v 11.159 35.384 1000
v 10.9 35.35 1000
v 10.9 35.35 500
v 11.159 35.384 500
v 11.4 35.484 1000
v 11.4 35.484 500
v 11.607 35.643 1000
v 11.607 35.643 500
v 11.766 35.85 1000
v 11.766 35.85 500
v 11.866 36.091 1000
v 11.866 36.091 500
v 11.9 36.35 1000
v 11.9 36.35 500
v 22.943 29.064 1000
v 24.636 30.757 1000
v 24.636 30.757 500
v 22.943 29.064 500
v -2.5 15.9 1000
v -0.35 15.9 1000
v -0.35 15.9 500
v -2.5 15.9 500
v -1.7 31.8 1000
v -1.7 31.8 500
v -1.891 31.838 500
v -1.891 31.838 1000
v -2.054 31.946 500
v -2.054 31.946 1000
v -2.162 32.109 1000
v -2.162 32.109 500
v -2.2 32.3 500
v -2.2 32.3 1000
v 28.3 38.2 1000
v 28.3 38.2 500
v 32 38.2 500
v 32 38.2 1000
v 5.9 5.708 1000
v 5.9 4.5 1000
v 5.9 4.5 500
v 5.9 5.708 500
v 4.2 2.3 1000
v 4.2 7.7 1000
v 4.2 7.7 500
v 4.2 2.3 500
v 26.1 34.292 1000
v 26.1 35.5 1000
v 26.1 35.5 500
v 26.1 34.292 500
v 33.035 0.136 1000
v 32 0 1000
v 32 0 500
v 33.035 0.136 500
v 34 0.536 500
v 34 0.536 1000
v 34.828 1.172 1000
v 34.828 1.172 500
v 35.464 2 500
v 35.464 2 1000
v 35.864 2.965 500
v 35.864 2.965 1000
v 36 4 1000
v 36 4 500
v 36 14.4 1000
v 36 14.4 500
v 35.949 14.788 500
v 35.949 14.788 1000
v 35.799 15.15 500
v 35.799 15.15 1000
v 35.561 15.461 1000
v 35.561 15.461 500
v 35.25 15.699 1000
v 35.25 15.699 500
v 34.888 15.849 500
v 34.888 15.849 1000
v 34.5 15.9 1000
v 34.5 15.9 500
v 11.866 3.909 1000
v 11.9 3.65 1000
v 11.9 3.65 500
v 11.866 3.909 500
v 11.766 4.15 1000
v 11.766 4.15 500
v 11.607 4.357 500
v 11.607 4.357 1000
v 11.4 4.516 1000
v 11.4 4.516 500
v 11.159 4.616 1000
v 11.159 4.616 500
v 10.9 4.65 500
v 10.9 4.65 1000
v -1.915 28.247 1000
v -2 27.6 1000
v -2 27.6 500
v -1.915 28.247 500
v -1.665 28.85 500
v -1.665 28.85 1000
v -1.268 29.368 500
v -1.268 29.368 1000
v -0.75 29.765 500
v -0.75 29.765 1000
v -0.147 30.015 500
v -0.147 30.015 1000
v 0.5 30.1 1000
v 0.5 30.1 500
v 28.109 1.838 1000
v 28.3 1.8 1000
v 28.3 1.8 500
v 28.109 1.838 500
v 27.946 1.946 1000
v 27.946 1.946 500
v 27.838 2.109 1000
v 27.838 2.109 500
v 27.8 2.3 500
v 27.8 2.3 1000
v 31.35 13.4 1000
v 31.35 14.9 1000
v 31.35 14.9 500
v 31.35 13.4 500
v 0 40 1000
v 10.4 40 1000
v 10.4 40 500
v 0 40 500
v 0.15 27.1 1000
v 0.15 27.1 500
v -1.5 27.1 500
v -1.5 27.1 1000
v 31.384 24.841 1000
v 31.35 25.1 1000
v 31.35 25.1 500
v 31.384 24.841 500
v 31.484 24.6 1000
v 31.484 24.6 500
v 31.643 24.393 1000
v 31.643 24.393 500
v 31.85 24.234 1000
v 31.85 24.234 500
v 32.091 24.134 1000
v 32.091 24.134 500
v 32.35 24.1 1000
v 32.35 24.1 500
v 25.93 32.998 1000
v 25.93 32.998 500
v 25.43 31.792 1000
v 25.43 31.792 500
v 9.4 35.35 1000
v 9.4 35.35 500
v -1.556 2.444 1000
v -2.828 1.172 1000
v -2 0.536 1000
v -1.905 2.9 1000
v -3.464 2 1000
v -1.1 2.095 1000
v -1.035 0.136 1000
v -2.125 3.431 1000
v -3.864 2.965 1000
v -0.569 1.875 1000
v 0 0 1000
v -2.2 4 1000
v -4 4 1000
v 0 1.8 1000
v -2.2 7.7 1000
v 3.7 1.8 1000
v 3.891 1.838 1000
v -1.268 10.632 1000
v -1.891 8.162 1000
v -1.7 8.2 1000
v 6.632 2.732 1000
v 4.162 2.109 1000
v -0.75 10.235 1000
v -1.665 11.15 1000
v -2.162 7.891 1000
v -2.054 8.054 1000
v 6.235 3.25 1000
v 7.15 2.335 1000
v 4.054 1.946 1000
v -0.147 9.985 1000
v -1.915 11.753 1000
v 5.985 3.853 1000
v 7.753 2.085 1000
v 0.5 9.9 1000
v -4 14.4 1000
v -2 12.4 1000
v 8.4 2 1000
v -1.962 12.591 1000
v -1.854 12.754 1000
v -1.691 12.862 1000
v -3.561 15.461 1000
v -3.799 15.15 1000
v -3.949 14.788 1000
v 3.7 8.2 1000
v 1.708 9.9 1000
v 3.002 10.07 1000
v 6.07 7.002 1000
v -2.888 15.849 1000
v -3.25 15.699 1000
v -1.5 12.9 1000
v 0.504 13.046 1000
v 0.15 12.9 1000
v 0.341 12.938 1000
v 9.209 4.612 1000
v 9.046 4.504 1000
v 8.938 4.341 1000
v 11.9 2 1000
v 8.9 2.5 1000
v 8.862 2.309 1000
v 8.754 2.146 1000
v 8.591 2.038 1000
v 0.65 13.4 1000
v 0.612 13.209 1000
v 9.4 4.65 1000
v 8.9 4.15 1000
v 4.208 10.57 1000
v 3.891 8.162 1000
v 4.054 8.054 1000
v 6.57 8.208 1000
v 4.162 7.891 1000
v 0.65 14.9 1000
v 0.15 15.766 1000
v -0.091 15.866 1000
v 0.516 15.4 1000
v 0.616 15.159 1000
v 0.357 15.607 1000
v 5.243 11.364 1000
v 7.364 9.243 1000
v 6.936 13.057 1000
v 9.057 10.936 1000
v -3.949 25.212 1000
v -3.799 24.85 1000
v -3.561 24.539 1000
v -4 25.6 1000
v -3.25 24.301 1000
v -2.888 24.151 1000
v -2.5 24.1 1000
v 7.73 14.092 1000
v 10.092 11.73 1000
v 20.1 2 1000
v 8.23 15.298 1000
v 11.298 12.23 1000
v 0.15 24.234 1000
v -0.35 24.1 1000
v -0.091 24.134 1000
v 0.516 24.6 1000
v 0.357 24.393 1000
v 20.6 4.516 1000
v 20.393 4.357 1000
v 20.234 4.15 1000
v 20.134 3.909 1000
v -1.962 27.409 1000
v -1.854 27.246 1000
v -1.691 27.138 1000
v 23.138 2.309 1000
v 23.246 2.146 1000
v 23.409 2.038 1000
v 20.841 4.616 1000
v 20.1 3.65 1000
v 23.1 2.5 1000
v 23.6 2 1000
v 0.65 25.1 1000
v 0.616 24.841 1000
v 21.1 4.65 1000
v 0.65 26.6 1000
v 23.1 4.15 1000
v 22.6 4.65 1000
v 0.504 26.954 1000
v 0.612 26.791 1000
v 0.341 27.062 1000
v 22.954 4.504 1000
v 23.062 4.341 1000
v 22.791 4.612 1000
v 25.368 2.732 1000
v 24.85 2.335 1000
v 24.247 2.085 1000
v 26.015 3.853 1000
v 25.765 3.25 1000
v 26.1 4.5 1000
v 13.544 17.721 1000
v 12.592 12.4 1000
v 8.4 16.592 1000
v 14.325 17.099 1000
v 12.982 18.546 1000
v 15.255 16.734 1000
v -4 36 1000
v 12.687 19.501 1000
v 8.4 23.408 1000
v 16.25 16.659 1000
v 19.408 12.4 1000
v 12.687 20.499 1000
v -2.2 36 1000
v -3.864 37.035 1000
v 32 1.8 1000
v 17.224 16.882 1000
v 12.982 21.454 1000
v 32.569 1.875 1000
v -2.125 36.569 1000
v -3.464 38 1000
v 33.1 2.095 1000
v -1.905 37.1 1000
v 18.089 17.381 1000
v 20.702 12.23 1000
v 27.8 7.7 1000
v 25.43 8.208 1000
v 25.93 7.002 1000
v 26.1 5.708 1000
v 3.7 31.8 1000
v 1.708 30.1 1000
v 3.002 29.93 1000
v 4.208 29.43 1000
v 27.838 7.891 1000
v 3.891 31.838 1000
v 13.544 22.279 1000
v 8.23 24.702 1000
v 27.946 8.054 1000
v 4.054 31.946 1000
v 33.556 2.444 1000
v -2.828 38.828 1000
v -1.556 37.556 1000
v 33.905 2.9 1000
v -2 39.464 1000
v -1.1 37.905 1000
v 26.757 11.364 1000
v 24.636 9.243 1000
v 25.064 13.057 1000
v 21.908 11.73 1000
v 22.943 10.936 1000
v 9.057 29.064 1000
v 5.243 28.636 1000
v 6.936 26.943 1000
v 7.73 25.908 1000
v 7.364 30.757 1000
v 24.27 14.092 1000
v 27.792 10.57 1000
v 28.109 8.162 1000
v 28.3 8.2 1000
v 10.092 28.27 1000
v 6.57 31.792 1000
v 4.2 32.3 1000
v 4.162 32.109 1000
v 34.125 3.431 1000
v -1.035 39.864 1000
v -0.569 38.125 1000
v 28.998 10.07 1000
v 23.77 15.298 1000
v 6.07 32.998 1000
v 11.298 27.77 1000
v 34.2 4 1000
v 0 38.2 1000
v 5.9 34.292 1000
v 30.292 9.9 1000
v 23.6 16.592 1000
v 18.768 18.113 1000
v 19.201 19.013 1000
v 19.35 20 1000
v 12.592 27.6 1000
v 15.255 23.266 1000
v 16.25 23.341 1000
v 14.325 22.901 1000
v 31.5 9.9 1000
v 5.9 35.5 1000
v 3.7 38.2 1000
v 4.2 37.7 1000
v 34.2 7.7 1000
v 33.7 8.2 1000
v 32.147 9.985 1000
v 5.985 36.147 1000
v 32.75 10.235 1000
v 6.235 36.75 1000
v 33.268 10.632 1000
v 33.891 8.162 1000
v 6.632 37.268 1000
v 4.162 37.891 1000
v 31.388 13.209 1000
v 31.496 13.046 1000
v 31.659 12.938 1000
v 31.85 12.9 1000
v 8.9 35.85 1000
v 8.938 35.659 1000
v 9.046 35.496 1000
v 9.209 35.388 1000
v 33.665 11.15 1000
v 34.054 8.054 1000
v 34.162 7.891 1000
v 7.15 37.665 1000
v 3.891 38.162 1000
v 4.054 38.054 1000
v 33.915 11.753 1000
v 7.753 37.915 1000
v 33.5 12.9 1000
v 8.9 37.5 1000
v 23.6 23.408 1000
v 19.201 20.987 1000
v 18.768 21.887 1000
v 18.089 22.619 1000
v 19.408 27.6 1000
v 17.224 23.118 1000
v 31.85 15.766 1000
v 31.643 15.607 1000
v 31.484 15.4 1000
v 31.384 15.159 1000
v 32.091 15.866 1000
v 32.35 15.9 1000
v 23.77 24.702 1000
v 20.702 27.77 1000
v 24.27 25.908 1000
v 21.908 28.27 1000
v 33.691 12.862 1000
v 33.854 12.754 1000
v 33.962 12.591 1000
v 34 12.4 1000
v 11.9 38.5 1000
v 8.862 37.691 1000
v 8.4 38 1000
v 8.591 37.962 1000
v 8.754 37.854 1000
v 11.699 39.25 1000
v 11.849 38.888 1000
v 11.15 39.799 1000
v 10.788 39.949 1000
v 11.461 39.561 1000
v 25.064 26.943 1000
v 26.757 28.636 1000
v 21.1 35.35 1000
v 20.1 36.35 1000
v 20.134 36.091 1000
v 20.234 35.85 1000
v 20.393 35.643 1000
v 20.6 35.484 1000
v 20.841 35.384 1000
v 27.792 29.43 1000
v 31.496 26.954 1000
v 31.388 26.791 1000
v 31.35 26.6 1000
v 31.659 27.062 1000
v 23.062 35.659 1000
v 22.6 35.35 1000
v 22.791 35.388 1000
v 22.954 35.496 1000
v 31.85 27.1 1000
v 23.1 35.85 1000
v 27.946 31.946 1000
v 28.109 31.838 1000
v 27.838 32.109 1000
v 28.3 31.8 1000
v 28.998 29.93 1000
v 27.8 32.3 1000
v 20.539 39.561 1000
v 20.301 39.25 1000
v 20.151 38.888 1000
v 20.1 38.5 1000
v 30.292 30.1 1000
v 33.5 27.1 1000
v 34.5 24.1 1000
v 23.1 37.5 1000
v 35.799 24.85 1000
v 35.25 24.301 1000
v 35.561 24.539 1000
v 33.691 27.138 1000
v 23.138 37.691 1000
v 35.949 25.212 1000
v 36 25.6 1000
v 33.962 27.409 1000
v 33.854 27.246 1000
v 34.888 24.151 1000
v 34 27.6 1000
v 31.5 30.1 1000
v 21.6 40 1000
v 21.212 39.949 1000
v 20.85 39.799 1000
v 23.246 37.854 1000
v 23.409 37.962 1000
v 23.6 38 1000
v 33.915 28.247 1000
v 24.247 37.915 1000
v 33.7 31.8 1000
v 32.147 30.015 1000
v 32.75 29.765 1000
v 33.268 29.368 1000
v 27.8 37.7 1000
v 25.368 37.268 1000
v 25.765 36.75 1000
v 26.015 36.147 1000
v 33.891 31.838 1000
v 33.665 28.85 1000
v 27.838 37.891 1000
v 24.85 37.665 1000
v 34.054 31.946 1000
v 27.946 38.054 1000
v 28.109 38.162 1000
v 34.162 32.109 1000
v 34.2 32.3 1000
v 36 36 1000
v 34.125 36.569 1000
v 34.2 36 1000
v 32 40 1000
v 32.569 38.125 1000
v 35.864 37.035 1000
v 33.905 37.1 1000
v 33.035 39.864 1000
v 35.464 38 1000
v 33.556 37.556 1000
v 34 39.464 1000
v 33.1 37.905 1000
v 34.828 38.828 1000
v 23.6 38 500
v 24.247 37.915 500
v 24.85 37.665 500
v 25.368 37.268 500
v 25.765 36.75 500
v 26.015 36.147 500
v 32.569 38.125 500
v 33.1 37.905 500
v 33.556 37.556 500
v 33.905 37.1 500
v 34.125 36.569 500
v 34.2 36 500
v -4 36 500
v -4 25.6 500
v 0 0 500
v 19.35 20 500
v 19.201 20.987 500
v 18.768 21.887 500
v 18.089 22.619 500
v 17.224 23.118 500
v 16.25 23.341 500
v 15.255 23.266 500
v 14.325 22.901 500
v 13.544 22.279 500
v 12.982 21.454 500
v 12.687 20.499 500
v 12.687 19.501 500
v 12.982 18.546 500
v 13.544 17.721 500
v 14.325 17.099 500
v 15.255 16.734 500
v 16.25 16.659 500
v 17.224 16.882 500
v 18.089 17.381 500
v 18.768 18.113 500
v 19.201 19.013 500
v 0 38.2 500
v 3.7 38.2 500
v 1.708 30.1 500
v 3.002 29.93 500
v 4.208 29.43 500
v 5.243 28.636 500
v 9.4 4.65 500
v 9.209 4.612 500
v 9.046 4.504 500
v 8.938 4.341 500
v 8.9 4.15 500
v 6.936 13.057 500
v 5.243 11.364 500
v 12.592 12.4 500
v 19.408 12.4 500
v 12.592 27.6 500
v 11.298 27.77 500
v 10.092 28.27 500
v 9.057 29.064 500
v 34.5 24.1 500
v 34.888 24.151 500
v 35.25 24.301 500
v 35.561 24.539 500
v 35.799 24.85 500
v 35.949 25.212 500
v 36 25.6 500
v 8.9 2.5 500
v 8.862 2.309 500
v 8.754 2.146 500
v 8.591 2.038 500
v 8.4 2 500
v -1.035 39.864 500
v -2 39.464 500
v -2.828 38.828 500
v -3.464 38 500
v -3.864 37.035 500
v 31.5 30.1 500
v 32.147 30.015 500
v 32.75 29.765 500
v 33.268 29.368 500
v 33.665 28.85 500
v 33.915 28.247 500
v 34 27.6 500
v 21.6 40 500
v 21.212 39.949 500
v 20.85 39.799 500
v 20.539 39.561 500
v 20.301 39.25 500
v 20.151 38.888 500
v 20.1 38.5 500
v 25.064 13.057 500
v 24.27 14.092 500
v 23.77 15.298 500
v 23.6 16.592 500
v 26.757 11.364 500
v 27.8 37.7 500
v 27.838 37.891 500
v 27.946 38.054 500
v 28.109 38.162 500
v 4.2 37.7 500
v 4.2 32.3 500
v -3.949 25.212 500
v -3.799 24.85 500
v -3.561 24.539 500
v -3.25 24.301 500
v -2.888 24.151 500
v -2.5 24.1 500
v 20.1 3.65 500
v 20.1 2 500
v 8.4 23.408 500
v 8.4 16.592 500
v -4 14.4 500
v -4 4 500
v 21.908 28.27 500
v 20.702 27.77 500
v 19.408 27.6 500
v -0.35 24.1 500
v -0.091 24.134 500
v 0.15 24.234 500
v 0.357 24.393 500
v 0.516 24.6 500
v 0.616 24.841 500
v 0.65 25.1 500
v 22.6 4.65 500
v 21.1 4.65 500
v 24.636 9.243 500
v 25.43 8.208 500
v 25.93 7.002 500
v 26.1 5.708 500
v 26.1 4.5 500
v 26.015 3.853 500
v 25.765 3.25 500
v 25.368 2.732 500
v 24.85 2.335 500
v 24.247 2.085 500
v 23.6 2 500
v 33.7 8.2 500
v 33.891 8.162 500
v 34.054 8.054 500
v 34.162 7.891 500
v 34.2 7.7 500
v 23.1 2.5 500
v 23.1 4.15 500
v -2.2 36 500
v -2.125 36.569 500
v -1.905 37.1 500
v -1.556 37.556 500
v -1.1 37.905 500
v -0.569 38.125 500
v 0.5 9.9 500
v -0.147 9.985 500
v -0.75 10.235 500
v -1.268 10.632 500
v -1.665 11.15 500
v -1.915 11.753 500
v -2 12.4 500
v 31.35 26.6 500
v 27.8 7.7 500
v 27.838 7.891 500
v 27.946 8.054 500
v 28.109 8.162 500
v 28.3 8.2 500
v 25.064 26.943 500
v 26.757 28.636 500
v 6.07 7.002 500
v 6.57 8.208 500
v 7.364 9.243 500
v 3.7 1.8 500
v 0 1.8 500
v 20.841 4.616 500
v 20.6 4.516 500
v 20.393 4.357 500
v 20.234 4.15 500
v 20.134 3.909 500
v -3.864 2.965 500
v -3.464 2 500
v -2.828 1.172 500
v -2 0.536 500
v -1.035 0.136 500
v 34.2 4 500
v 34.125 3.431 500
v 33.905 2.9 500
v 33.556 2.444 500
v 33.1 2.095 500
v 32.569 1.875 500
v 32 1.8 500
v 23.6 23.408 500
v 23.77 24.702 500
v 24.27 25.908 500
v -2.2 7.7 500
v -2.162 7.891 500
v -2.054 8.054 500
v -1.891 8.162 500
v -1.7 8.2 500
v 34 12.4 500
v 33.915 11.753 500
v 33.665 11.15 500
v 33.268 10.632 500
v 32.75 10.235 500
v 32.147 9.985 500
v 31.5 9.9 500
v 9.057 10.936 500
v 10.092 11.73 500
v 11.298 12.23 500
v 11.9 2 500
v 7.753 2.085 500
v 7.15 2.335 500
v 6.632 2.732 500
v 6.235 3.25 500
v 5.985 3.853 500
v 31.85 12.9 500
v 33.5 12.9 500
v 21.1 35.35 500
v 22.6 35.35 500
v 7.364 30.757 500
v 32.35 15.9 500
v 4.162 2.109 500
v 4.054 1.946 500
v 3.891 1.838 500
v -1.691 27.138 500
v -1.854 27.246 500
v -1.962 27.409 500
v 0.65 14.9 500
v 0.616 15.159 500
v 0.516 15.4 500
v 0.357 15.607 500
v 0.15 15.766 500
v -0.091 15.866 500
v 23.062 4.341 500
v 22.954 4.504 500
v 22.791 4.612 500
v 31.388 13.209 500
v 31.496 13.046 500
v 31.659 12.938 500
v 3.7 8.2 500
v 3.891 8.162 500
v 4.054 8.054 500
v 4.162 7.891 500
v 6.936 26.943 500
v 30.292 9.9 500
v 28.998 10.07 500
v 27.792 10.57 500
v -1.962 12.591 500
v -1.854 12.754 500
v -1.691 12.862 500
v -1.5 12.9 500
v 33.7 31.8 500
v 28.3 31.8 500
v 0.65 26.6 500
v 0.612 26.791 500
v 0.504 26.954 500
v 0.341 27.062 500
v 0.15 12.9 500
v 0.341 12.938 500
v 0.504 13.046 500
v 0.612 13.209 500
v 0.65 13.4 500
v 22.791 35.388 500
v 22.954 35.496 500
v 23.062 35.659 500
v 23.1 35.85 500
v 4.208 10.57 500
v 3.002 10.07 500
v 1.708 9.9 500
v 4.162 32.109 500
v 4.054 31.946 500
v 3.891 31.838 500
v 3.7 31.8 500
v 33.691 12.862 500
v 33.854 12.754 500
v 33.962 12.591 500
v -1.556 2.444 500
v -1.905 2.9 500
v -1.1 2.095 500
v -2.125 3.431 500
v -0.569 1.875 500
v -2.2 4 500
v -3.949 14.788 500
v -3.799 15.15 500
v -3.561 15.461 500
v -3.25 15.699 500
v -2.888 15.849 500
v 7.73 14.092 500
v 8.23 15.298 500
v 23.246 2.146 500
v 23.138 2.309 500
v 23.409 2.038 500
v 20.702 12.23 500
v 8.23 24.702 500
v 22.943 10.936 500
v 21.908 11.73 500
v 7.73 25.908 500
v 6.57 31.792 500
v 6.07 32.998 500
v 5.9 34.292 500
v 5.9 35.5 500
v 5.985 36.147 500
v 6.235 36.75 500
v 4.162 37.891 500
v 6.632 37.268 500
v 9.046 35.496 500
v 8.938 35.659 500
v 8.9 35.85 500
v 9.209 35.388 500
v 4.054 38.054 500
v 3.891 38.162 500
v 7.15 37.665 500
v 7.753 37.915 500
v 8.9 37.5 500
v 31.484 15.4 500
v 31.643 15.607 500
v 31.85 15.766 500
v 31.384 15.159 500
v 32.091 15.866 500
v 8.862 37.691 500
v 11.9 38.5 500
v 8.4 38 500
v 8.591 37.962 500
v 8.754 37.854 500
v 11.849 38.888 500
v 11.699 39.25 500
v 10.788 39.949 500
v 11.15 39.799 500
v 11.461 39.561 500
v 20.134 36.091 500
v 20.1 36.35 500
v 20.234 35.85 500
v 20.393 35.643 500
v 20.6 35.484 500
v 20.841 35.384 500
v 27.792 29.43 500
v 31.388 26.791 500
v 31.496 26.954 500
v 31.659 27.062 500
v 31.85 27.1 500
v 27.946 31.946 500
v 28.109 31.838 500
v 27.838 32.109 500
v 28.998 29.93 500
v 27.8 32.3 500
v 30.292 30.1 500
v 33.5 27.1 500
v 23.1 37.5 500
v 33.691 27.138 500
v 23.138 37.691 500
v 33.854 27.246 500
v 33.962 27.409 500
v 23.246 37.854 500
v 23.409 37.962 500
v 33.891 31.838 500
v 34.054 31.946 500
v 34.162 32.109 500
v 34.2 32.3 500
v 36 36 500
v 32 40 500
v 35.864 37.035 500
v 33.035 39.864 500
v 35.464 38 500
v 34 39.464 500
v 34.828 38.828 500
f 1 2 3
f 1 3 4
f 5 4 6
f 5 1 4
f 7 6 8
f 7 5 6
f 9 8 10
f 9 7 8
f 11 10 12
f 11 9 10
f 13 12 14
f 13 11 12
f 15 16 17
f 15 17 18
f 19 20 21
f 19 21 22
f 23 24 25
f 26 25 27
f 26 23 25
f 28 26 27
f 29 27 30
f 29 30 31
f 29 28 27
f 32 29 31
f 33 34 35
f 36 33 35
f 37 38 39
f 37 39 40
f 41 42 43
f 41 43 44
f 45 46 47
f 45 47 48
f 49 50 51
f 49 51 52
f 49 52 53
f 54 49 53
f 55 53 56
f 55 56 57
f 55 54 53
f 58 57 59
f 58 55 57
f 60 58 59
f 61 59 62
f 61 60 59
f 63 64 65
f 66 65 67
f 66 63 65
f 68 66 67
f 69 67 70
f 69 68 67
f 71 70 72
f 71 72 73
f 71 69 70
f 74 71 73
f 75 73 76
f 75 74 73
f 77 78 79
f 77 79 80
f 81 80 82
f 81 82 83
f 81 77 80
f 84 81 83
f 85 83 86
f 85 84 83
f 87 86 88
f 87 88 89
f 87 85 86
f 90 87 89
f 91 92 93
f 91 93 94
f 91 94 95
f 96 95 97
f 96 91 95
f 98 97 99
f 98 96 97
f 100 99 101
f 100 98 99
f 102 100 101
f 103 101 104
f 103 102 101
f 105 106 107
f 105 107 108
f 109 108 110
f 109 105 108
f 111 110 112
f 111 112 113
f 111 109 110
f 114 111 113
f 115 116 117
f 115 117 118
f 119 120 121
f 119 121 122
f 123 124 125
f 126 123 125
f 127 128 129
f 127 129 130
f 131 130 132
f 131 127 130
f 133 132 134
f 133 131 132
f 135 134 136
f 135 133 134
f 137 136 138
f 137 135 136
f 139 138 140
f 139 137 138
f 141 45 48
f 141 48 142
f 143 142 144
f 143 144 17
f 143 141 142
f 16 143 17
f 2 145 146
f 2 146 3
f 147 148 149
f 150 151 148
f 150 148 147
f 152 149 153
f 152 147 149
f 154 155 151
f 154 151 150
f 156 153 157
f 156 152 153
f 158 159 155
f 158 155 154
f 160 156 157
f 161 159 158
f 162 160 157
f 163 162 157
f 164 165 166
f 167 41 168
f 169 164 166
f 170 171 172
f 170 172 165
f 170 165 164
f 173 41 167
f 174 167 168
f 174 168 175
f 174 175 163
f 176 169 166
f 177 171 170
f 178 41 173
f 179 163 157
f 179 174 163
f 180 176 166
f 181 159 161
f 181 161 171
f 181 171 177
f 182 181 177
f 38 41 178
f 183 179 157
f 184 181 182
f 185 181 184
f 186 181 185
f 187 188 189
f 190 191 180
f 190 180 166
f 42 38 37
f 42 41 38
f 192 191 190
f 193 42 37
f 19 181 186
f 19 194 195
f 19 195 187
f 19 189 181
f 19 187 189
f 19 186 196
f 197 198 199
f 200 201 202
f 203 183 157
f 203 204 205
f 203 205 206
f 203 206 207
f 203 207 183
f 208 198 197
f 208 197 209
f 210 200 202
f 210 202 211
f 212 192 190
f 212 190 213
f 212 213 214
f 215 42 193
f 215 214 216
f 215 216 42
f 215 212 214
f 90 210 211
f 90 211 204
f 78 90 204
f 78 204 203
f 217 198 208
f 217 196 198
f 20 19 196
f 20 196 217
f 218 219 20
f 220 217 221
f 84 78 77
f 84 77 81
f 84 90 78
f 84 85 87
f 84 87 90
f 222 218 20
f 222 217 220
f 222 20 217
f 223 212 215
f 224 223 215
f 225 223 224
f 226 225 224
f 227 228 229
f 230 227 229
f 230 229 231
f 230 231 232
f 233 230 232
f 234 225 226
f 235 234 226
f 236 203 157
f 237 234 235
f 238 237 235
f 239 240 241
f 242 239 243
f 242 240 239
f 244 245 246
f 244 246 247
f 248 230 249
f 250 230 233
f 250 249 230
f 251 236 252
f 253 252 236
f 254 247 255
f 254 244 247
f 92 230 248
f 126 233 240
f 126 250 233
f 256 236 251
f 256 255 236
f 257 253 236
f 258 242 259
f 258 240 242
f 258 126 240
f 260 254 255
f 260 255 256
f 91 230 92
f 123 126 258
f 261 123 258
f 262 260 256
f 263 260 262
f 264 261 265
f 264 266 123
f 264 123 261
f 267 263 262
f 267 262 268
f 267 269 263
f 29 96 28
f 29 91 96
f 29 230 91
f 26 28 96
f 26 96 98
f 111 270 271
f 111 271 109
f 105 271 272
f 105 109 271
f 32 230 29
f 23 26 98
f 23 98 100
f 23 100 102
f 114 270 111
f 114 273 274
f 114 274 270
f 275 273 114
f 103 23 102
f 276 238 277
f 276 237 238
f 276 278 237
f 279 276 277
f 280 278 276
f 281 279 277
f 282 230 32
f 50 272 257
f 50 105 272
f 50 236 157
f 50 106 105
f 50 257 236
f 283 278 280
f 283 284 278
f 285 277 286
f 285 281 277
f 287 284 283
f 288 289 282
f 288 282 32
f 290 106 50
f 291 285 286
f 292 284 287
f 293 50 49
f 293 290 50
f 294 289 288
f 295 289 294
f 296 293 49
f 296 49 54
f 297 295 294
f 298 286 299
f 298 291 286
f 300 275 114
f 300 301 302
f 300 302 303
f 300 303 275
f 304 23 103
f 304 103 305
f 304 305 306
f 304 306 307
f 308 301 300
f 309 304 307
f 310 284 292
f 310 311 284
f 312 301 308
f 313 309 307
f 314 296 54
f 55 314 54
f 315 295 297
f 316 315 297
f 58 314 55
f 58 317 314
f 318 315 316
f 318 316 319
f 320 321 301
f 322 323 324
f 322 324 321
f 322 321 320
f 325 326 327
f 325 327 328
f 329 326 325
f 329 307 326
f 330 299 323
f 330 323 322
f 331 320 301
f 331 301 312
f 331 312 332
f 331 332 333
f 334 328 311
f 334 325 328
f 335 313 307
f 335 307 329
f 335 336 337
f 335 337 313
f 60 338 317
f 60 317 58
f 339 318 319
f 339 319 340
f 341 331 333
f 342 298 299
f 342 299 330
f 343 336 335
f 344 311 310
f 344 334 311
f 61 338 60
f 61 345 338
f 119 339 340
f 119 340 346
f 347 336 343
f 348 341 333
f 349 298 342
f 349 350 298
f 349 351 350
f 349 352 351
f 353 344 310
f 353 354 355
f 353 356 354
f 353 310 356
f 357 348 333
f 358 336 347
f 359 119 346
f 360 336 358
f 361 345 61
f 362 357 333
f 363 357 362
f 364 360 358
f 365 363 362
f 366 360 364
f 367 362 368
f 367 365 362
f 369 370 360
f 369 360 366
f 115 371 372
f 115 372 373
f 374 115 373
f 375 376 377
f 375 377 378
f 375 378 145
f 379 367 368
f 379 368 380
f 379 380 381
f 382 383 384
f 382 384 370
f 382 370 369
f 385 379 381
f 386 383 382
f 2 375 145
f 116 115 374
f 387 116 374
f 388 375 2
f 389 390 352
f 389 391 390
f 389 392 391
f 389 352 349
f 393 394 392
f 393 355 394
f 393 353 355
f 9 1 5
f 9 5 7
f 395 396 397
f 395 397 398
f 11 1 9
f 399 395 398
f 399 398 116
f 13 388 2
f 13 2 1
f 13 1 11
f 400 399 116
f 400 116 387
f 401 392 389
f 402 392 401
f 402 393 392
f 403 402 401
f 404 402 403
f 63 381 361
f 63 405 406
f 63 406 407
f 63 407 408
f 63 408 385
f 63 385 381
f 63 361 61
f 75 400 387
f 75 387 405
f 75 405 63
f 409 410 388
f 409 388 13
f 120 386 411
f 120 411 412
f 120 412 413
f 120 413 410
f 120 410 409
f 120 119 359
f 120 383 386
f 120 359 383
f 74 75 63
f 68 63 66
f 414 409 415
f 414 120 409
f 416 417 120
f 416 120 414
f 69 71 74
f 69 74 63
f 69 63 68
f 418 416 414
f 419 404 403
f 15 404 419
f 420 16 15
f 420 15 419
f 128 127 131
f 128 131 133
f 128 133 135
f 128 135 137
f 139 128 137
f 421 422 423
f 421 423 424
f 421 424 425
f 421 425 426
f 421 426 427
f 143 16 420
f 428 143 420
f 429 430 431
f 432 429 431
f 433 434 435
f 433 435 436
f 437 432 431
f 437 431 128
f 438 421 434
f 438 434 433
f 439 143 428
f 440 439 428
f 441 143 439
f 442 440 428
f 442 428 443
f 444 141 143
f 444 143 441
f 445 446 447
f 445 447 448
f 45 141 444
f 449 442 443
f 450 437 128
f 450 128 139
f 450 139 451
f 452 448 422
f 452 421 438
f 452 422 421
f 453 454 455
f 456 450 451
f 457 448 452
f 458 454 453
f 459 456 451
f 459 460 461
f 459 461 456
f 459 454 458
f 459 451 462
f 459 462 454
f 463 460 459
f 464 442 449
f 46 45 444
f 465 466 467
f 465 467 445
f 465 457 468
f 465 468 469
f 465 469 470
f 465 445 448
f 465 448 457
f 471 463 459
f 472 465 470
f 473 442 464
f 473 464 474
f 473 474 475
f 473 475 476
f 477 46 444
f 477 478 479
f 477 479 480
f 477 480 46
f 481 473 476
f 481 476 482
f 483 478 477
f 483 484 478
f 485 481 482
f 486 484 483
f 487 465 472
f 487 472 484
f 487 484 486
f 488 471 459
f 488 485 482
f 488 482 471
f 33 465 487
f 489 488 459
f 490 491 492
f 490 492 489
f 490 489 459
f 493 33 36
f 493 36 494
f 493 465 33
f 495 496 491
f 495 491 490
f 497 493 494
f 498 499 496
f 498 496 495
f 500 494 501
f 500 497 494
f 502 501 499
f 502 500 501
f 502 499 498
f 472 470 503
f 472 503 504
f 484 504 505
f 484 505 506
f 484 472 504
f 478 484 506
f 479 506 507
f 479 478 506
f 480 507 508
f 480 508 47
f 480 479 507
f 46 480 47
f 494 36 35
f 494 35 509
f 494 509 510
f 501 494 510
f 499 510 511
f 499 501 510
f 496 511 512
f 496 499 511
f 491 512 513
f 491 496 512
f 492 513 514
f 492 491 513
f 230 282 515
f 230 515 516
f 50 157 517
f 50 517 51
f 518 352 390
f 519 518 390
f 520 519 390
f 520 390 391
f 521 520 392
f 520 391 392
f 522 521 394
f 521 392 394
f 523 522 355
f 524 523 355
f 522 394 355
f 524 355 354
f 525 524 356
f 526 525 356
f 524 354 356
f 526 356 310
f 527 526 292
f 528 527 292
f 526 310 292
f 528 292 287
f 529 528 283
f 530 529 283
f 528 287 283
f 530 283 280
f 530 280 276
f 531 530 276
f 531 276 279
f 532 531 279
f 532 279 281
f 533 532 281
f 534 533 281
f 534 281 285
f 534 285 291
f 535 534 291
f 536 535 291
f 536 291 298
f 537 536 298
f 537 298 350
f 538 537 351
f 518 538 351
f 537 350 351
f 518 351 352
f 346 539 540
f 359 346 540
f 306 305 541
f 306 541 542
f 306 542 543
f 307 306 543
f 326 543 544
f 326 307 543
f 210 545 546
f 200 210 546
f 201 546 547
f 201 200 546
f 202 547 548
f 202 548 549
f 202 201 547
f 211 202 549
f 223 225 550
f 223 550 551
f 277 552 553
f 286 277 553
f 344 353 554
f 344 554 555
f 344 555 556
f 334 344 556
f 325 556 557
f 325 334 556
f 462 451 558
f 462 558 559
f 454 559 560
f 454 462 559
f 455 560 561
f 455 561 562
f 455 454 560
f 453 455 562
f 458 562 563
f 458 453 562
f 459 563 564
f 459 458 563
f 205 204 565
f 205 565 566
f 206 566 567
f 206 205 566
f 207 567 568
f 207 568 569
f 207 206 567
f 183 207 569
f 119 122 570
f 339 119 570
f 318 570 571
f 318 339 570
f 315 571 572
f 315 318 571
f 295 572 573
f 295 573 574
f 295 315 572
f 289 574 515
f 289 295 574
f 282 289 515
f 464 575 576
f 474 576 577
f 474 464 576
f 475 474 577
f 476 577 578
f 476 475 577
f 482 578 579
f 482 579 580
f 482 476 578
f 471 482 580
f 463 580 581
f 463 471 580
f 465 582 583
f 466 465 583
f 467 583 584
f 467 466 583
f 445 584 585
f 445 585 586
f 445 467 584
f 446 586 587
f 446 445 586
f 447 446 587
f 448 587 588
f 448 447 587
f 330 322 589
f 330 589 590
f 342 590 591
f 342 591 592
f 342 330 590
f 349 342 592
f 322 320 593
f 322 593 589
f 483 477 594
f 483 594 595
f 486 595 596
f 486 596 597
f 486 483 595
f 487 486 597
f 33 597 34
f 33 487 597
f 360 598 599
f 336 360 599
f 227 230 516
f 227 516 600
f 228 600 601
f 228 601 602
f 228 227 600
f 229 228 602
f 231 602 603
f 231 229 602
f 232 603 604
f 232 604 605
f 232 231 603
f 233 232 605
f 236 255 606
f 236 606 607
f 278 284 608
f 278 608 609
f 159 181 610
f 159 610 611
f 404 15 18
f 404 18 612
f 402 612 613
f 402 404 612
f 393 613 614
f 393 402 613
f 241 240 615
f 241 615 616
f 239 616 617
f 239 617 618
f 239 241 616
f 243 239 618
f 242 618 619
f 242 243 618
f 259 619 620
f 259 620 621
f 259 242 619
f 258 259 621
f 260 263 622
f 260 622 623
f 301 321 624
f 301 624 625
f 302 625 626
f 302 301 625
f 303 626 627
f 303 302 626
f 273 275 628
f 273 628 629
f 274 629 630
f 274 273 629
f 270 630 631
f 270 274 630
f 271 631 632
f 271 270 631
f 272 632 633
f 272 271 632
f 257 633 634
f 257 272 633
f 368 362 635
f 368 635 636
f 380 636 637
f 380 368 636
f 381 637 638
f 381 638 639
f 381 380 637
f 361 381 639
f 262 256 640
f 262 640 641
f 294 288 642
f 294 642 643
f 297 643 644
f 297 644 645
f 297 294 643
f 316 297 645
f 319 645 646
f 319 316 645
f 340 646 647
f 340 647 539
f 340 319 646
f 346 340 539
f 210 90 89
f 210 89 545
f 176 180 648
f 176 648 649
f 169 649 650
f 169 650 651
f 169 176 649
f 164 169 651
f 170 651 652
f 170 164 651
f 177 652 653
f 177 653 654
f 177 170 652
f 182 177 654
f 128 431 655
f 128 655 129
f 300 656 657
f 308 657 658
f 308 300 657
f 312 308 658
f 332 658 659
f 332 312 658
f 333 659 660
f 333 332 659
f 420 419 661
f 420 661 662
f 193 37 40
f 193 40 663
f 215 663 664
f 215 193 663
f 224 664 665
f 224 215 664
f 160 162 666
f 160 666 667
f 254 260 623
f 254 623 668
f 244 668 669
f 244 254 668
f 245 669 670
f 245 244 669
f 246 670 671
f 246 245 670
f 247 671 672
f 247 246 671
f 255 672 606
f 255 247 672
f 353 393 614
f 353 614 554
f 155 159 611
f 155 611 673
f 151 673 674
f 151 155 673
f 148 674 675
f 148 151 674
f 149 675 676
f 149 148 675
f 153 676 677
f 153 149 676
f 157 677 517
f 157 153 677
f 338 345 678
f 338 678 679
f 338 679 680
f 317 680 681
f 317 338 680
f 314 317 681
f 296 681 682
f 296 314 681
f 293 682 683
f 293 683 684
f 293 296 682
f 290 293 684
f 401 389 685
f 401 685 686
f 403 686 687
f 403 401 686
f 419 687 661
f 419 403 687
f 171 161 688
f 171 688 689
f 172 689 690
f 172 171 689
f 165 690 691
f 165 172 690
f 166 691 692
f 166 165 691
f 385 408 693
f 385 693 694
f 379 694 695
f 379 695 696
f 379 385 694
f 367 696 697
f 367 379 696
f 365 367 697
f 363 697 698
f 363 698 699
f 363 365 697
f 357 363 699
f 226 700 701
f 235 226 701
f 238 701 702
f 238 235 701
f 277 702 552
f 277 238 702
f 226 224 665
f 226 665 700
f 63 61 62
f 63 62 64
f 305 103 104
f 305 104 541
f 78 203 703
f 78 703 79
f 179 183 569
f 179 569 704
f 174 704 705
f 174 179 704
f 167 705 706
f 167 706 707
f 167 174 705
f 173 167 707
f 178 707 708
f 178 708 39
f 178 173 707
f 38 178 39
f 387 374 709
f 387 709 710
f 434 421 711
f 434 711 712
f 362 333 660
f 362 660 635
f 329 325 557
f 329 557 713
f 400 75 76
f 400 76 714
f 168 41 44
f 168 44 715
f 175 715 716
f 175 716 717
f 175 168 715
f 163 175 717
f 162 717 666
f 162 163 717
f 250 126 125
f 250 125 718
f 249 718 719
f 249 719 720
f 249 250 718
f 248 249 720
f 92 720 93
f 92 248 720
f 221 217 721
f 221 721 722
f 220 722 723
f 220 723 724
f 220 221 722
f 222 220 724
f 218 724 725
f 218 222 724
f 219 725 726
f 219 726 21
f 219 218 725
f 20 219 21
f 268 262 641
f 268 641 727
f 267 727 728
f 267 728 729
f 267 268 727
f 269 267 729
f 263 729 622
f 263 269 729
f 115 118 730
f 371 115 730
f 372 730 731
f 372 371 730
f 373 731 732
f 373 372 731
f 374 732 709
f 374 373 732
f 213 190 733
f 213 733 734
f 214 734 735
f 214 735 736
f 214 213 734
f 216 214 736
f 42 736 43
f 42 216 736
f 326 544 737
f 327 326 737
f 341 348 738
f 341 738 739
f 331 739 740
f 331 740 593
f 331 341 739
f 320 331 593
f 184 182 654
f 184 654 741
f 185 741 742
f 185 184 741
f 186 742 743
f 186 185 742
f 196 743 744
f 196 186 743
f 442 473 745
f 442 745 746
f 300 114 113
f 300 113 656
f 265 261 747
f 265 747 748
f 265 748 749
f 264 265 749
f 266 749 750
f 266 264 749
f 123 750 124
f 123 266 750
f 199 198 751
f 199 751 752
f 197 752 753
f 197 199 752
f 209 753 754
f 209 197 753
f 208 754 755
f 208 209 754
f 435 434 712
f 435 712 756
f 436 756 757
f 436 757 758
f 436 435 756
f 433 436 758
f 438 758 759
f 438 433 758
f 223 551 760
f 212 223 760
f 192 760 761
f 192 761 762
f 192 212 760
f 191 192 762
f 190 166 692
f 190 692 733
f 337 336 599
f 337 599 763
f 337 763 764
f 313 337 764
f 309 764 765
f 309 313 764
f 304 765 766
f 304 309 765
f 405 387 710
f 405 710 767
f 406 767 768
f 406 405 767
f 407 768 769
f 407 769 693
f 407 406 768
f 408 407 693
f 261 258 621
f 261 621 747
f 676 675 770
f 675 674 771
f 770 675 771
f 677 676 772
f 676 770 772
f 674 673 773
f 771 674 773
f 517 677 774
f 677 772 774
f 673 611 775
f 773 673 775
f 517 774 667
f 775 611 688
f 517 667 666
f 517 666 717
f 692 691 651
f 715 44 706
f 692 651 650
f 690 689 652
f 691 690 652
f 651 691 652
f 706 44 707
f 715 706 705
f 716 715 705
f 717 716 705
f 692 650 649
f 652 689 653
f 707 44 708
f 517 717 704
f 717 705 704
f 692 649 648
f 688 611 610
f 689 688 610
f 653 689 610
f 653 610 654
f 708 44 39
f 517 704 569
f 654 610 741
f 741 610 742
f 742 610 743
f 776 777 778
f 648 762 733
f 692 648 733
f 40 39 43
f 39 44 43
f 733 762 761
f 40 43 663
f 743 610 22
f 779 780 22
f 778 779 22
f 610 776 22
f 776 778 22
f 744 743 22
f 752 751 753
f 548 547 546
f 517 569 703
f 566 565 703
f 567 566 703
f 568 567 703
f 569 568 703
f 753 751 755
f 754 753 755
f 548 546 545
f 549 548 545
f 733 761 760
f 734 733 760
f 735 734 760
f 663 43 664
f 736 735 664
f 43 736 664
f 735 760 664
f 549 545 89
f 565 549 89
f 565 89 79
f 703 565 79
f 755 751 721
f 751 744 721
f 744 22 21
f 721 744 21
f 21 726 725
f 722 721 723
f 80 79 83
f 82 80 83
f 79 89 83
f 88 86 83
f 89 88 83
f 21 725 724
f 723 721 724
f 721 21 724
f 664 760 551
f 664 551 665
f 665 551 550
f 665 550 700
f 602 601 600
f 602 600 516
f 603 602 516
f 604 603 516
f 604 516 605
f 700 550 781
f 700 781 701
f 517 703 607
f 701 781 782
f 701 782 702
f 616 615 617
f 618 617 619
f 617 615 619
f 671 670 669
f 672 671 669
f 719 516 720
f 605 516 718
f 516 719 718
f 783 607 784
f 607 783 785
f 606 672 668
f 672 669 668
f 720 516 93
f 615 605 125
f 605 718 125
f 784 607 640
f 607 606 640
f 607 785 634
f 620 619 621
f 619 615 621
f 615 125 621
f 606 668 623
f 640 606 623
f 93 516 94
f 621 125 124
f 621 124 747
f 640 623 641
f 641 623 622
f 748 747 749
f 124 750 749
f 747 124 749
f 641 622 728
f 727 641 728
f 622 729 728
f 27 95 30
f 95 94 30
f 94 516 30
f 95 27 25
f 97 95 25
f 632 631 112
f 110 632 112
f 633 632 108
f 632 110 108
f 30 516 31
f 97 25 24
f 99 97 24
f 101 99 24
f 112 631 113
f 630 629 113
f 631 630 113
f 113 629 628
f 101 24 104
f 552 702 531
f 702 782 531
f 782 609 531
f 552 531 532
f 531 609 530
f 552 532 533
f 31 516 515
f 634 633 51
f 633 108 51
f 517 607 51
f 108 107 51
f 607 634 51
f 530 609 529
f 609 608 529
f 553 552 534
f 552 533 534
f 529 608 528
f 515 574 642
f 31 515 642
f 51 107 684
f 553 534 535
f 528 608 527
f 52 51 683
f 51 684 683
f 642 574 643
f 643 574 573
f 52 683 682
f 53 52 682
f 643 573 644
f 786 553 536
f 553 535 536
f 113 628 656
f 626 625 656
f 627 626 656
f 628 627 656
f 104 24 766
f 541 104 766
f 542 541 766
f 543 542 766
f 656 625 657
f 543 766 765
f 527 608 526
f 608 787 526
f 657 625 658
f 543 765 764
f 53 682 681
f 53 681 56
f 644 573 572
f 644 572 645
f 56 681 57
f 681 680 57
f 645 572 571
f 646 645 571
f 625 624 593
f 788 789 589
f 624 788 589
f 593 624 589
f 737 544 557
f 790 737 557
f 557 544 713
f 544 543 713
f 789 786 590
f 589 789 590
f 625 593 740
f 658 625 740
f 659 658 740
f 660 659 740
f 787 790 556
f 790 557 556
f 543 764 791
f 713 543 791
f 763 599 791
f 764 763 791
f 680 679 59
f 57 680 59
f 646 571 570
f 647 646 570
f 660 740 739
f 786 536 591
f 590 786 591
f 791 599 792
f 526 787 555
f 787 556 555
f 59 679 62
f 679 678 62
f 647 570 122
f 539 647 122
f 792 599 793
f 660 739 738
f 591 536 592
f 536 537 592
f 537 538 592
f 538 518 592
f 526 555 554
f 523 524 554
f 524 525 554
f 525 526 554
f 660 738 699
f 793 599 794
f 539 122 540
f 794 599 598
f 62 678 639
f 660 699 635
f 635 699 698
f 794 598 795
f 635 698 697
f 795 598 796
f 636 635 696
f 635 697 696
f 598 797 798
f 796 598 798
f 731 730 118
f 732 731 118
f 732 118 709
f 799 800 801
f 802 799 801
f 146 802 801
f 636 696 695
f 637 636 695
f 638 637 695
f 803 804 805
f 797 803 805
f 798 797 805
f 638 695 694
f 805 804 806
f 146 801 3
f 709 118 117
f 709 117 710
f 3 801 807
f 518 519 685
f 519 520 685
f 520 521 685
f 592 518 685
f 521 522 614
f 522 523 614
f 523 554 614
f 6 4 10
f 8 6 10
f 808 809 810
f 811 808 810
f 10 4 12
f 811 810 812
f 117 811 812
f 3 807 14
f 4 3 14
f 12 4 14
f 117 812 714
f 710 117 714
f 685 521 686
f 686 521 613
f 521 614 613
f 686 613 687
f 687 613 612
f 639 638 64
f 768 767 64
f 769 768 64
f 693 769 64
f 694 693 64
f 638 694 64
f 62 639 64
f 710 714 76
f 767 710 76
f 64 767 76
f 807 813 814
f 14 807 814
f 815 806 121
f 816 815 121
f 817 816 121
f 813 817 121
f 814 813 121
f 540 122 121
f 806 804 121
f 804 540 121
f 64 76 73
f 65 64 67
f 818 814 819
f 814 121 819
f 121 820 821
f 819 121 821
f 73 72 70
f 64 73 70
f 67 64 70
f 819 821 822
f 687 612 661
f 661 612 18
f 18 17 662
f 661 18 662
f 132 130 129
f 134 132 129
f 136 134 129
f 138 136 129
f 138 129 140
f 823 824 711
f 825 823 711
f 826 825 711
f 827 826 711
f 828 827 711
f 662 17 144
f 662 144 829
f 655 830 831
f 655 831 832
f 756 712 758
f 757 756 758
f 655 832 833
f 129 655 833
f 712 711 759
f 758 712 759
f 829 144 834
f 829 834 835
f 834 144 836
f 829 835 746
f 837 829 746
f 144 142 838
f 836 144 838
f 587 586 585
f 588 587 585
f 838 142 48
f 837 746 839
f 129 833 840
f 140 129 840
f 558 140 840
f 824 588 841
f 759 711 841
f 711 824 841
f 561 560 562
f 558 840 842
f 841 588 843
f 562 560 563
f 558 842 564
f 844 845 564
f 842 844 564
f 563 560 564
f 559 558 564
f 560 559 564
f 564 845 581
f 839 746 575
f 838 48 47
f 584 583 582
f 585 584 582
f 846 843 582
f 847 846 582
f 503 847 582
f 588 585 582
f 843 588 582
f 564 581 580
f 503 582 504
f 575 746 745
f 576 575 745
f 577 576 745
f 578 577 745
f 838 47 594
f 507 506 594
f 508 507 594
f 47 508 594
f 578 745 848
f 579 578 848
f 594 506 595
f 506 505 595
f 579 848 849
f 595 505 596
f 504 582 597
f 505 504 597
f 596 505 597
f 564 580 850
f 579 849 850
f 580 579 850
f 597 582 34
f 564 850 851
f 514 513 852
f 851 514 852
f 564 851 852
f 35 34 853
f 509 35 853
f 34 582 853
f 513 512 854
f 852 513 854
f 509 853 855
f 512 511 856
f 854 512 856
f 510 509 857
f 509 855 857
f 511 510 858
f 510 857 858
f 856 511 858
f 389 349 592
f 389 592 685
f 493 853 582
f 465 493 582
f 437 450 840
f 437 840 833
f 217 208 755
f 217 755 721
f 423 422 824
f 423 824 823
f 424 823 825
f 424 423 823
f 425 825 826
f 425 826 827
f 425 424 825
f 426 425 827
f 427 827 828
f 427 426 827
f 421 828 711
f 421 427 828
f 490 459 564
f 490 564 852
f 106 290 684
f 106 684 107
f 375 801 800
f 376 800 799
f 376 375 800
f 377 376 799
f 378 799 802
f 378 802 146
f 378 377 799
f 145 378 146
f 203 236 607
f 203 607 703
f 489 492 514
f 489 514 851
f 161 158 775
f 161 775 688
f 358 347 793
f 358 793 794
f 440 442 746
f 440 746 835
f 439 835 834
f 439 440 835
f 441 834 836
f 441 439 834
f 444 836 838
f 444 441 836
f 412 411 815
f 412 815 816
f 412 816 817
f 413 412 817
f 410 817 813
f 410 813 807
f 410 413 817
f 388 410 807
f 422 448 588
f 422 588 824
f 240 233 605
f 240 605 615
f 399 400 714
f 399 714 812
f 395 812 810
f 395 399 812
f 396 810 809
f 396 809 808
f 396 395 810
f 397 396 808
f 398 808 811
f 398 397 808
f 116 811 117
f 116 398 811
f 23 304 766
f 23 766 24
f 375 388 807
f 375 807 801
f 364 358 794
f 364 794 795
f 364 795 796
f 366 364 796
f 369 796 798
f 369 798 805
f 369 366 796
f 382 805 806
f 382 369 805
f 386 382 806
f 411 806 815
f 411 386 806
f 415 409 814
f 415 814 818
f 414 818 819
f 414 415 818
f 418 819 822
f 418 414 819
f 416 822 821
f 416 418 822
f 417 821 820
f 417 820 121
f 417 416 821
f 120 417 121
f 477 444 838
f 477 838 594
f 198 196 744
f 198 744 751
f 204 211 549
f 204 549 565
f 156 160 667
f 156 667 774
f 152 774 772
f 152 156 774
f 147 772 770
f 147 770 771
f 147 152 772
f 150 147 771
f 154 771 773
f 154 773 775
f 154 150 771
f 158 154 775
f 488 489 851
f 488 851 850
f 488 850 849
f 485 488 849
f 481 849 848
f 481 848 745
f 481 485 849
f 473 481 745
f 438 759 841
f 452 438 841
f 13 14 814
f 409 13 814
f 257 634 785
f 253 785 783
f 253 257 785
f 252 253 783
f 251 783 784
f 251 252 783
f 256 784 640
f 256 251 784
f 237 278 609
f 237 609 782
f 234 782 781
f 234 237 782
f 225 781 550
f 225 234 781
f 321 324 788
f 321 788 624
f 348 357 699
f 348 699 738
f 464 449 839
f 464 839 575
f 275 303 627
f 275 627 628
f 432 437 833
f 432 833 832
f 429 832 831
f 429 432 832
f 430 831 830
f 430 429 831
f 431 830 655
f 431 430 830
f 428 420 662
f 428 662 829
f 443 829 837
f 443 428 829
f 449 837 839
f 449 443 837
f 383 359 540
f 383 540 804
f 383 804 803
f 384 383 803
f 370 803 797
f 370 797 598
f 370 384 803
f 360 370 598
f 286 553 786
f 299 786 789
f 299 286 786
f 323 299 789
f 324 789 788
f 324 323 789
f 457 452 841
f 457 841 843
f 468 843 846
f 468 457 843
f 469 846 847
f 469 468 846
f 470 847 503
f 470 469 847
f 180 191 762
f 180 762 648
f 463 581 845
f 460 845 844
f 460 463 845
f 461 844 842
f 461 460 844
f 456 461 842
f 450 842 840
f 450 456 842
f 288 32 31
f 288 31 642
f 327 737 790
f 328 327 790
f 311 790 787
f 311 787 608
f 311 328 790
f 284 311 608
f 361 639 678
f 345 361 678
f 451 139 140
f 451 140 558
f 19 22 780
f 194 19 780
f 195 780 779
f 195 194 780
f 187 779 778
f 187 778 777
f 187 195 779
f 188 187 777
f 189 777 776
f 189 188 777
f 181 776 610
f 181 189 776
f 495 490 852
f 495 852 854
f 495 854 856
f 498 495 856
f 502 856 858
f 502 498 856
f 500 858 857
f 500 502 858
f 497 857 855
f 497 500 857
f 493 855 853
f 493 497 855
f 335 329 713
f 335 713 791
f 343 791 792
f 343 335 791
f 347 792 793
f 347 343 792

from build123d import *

# Parameters (mm, degrees)
SKIZZE1_R                       = 3.35
AUFSATZ_LINEAR_AUSTRAGEN1_DEPTH = 500


with BuildPart() as part:
    # Skizze1 → Aufsatz-Linear austragen1 (new body)
    with BuildSketch(Plane.XY.offset(1000)):
        with BuildLine():
            Line((5.899999985, 34.292388165), (5.899999985, 35.500000003))
            ThreePointArc((5.899999985, 35.500000003), (6.632233037, 37.267766961), (8.399999999, 38.000000003))
            ThreePointArc((8.399999999, 38.000000003), (8.753553388, 37.853553393), (8.899999996, 37.500000003))
            Line((8.899999996, 37.500000003), (8.899999996, 35.850000004))
            ThreePointArc((8.899999996, 35.850000004), (9.046446605, 35.496446613), (9.399999996, 35.350000004))
            Line((9.399999996, 35.350000004), (10.899999947, 35.350000004))
            ThreePointArc((10.899999947, 35.350000004), (11.607106728, 35.642893223), (11.899999947, 36.350000004))
            Line((11.899999947, 36.350000004), (11.899999947, 38.500000016))
            ThreePointArc((11.899999947, 38.500000016), (11.460660119, 39.560660188), (10.399999947, 40.000000016))
            Line((10.399999947, 40.000000016), (5.2e-08, 40.000000016))
            ThreePointArc((5.2e-08, 40.000000016), (-2.828427117, 38.828427123), (-4.000000011, 35.999999954))
            Line((-4.000000011, 35.999999954), (-4.000000011, 25.599999996))
            ThreePointArc((-4.000000011, 25.599999996), (-3.560660183, 24.539339825), (-2.500000012, 24.099999997))
            Line((-2.500000012, 24.099999997), (-0.350000011, 24.099999997))
            ThreePointArc((-0.350000011, 24.099999997), (0.35710677, 24.392893216), (0.649999989, 25.099999997))
            Line((0.649999989, 25.099999997), (0.649999989, 26.599999997))
            ThreePointArc((0.649999989, 26.599999997), (0.50355338, 26.953553387), (0.149999989, 27.099999997))
            Line((0.149999989, 27.099999997), (-1.500000011, 27.099999997))
            ThreePointArc((-1.500000011, 27.099999997), (-1.853553401, 27.246446605), (-2.000000011, 27.599999993))
            ThreePointArc((-2.000000011, 27.599999993), (-1.26776697, 29.367766957), (0.499999989, 30.10000001))
            Line((0.499999989, 30.10000001), (1.707611833, 30.10000001))
            ThreePointArc((1.707611833, 30.10000001), (3.621028995, 29.719397673), (5.243145739, 28.635533916))
            Line((5.243145739, 28.635533916), (6.935533894, 26.943145761))
            ThreePointArc((6.935533894, 26.943145761), (8.01939765, 25.321029017), (8.399999988, 23.407611855))
            Line((8.399999988, 23.407611855), (8.399999988, 16.592388122))
            ThreePointArc((8.399999988, 16.592388122), (8.01939765, 14.678970961), (6.935533894, 13.056854217))
            Line((6.935533894, 13.056854217), (5.243145737, 11.36446606))
            ThreePointArc((5.243145737, 11.36446606), (3.621028993, 10.280602303), (1.707611831, 9.899999966))
            Line((1.707611831, 9.899999966), (0.49999999, 9.899999966))
            ThreePointArc((0.49999999, 9.899999966), (-1.267766968, 10.632233018), (-2.00000001, 12.399999979))
            ThreePointArc((-2.00000001, 12.399999979), (-1.8535534, 12.753553368), (-1.50000001, 12.899999977))
            Line((-1.50000001, 12.899999977), (0.149999989, 12.899999977))
            ThreePointArc((0.149999989, 12.899999977), (0.50355338, 13.046446586), (0.649999989, 13.399999977))
            Line((0.649999989, 13.399999977), (0.649999989, 14.899999976))
            ThreePointArc((0.649999989, 14.899999976), (0.35710677, 15.607106757), (-0.350000011, 15.899999976))
            Line((-0.350000011, 15.899999976), (-2.50000001, 15.899999976))
            ThreePointArc((-2.50000001, 15.899999976), (-3.560660182, 15.460660148), (-4.000000011, 14.399999976))
            Line((-4.000000011, 14.399999976), (-4.000000011, 4.000000069))
            ThreePointArc((-4.000000011, 4.000000069), (-2.828427121, 1.171572909), (4e-08, 1.9e-08))
            Line((4e-08, 1.9e-08), (31.999999925, 1.9e-08))
            ThreePointArc((31.999999925, 1.9e-08), (34.828427086, 1.171572909), (35.999999976, 4.00000007))
            Line((35.999999976, 4.00000007), (35.999999976, 14.399999977))
            ThreePointArc((35.999999976, 14.399999977), (35.560660149, 15.460660148), (34.499999978, 15.899999976))
            Line((34.499999978, 15.899999976), (32.349999991, 15.899999976))
            ThreePointArc((32.349999991, 15.899999976), (31.642893209, 15.607106757), (31.34999999, 14.899999976))
            Line((31.34999999, 14.899999976), (31.34999999, 13.399999977))
            ThreePointArc((31.34999999, 13.399999977), (31.4964466, 13.046446586), (31.84999999, 12.899999977))
            Line((31.84999999, 12.899999977), (33.499999991, 12.899999977))
            ThreePointArc((33.499999991, 12.899999977), (33.853553381, 12.753553368), (33.999999991, 12.399999979))
            ThreePointArc((33.999999991, 12.399999979), (33.267766949, 10.632233018), (31.499999991, 9.899999966))
            Line((31.499999991, 9.899999966), (30.292388185, 9.899999966))
            ThreePointArc((30.292388185, 9.899999966), (28.378971023, 10.280602303), (26.756854279, 11.36446606))
            Line((26.756854279, 11.36446606), (25.064466082, 13.056854257))
            ThreePointArc((25.064466082, 13.056854257), (23.980602325, 14.678971001), (23.599999988, 16.592388163))
            Line((23.599999988, 16.592388163), (23.599999988, 23.407611842))
            ThreePointArc((23.599999988, 23.407611842), (23.980602325, 25.321029004), (25.064466082, 26.943145747))
            Line((25.064466082, 26.943145747), (26.75685425, 28.635533916))
            ThreePointArc((26.75685425, 28.635533916), (28.378970995, 29.719397673), (30.292388156, 30.10000001))
            Line((30.292388156, 30.10000001), (31.499999989, 30.10000001))
            ThreePointArc((31.499999989, 30.10000001), (33.267766948, 29.367766957), (33.999999989, 27.599999993))
            ThreePointArc((33.999999989, 27.599999993), (33.853553379, 27.246446605), (33.499999989, 27.099999997))
            Line((33.499999989, 27.099999997), (31.84999999, 27.099999997))
            ThreePointArc((31.84999999, 27.099999997), (31.4964466, 26.953553387), (31.34999999, 26.599999997))
            Line((31.34999999, 26.599999997), (31.34999999, 25.099999997))
            ThreePointArc((31.34999999, 25.099999997), (31.642893209, 24.392893216), (32.34999999, 24.099999997))
            Line((32.34999999, 24.099999997), (34.499999976, 24.099999997))
            ThreePointArc((34.499999976, 24.099999997), (35.560660148, 24.539339825), (35.999999976, 25.599999997))
            Line((35.999999976, 25.599999997), (35.999999976, 35.999999953))
            ThreePointArc((35.999999976, 35.999999953), (34.828427083, 38.828427123), (31.999999914, 40.000000016))
            Line((31.999999914, 40.000000016), (21.600000015, 40.000000016))
            ThreePointArc((21.600000015, 40.000000016), (20.539339844, 39.560660188), (20.100000016, 38.500000017))
            Line((20.100000016, 38.500000017), (20.100000016, 36.350000004))
            ThreePointArc((20.100000016, 36.350000004), (20.392893235, 35.642893223), (21.100000017, 35.350000004))
            Line((21.100000017, 35.350000004), (22.600000014, 35.350000004))
            ThreePointArc((22.600000014, 35.350000004), (22.953553405, 35.496446613), (23.100000014, 35.850000004))
            Line((23.100000014, 35.850000004), (23.100000014, 37.500000007))
            ThreePointArc((23.100000014, 37.500000007), (23.246446625, 37.8535534), (23.600000019, 38.000000007))
            ThreePointArc((23.600000019, 38.000000007), (25.367766955, 37.267766951), (26.099999992, 35.500000007))
            Line((26.099999992, 35.500000007), (26.099999992, 34.292388127))
            ThreePointArc((26.099999992, 34.292388127), (25.719397655, 32.378970966), (24.635533898, 30.756854221))
            Line((24.635533898, 30.756854221), (22.943145779, 29.064466103))
            ThreePointArc((22.943145779, 29.064466103), (21.321029035, 27.980602346), (19.407611873, 27.600000009))
            Line((19.407611873, 27.600000009), (12.592388142, 27.600000009))
            ThreePointArc((12.592388142, 27.600000009), (10.678970981, 27.980602346), (9.056854237, 29.064466102))
            Line((9.056854237, 29.064466102), (7.36446608, 30.75685426))
            ThreePointArc((7.36446608, 30.75685426), (6.280602323, 32.378971004), (5.899999985, 34.292388165))
        make_face()
        with Locations((15.999999985, 20)):
            Circle(SKIZZE1_R, mode=Mode.SUBTRACT)
        with BuildLine():
            Line((27.799999996, 32.299999708), (27.799999996, 37.700000083))
            ThreePointArc((27.799999996, 37.700000083), (27.946446591, 38.053553439), (28.299999947, 38.200000034))
            Line((28.299999947, 38.200000034), (31.999999914, 38.200000034))
            ThreePointArc((31.999999914, 38.200000034), (33.555634889, 37.555634929), (34.199999994, 35.999999953))
            Line((34.199999994, 35.999999953), (34.199999994, 32.300000046))
            ThreePointArc((34.199999994, 32.300000046), (34.053553382, 31.946446648), (33.699999983, 31.800000035))
            Line((33.699999983, 31.800000035), (28.299999669, 31.800000035))
            ThreePointArc((28.299999669, 31.800000035), (27.94644651, 31.946446549), (27.799999996, 32.299999708))
        make_face(mode=Mode.SUBTRACT)
        with BuildLine():
            Line((28.299999669, 8.199999998), (33.700000043, 8.199999998))
            ThreePointArc((33.700000043, 8.199999998), (34.053553399, 8.053553402), (34.199999994, 7.700000046))
            Line((34.199999994, 7.700000046), (34.199999994, 4.00000007))
            ThreePointArc((34.199999994, 4.00000007), (33.555634893, 2.444365103), (31.999999925, 1.800000001))
            Line((31.999999925, 1.800000001), (28.300000007, 1.800000001))
            ThreePointArc((28.300000007, 1.800000001), (27.946446609, 1.946446613), (27.799999996, 2.300000012))
            Line((27.799999996, 2.300000012), (27.799999996, 7.700000324))
            ThreePointArc((27.799999996, 7.700000324), (27.94644651, 8.053553484), (28.299999669, 8.199999998))
        make_face(mode=Mode.SUBTRACT)
        with BuildLine():
            Line((3.700000285, 31.800000035), (-1.700000077, 31.800000035))
            ThreePointArc((-1.700000077, 31.800000035), (-2.053553433, 31.94644663), (-2.200000029, 32.299999986))
            Line((-2.200000029, 32.299999986), (-2.200000029, 35.999999954))
            ThreePointArc((-2.200000029, 35.999999954), (-1.555634924, 37.555634929), (5.2e-08, 38.200000034))
            Line((5.2e-08, 38.200000034), (3.699999947, 38.200000034))
            ThreePointArc((3.699999947, 38.200000034), (4.053553346, 38.053553422), (4.199999959, 37.700000023))
            Line((4.199999959, 37.700000023), (4.199999959, 32.299999708))
            ThreePointArc((4.199999959, 32.299999708), (4.053553445, 31.946446549), (3.700000285, 31.800000035))
        make_face(mode=Mode.SUBTRACT)
        with BuildLine():
            Line((4.199999959, 7.700000324), (4.199999959, 2.299999952))
            ThreePointArc((4.199999959, 2.299999952), (4.053553363, 1.946446596), (3.700000007, 1.800000001))
            Line((3.700000007, 1.800000001), (4e-08, 1.800000001))
            ThreePointArc((4e-08, 1.800000001), (-1.555634927, 2.444365102), (-2.200000029, 4.000000069))
            Line((-2.200000029, 4.000000069), (-2.200000029, 7.699999986))
            ThreePointArc((-2.200000029, 7.699999986), (-2.053553416, 8.053553385), (-1.700000017, 8.199999998))
            Line((-1.700000017, 8.199999998), (3.700000285, 8.199999998))
            ThreePointArc((3.700000285, 8.199999998), (4.053553445, 8.053553484), (4.199999959, 7.700000324))
        make_face(mode=Mode.SUBTRACT)
        with BuildLine():
            Line((20.100000016, 2.000000008), (11.899999947, 2.000000008))
            Line((11.899999947, 2.000000008), (11.899999947, 3.649999992))
            ThreePointArc((11.899999947, 3.649999992), (11.607106728, 4.357106773), (10.899999947, 4.649999992))
            Line((10.899999947, 4.649999992), (9.399999996, 4.649999992))
            ThreePointArc((9.399999996, 4.649999992), (9.046446606, 4.503553382), (8.899999996, 4.149999992))
            Line((8.899999996, 4.149999992), (8.899999996, 2.499999991))
            ThreePointArc((8.899999996, 2.499999991), (8.753553389, 2.146446604), (8.400000003, 1.999999994))
            ThreePointArc((8.400000003, 1.999999994), (6.632233039, 2.732233035), (5.899999985, 4.499999994))
            Line((5.899999985, 4.499999994), (5.899999985, 5.707611838))
            ThreePointArc((5.899999985, 5.707611838), (6.280602323, 7.621029001), (7.36446608, 9.243145746))
            Line((7.36446608, 9.243145746), (9.056854238, 10.935533903))
            ThreePointArc((9.056854238, 10.935533903), (10.678970982, 12.01939766), (12.592388143, 12.399999997))
            Line((12.592388143, 12.399999997), (19.407611847, 12.399999997))
            ThreePointArc((19.407611847, 12.399999997), (21.321029008, 12.01939766), (22.943145752, 10.935533904))
            Line((22.943145752, 10.935533904), (24.635533898, 9.243145757))
            ThreePointArc((24.635533898, 9.243145757), (25.719397655, 7.621029013), (26.099999992, 5.707611851))
            Line((26.099999992, 5.707611851), (26.099999992, 4.499999993))
            ThreePointArc((26.099999992, 4.499999993), (25.367766954, 2.73223305), (23.600000019, 1.999999995))
            ThreePointArc((23.600000019, 1.999999995), (23.246446625, 2.146446603), (23.100000014, 2.499999995))
            Line((23.100000014, 2.499999995), (23.100000014, 4.149999994))
            ThreePointArc((23.100000014, 4.149999994), (22.953553405, 4.503553383), (22.600000016, 4.649999992))
            Line((22.600000016, 4.649999992), (21.100000017, 4.649999992))
            ThreePointArc((21.100000017, 4.649999992), (20.392893235, 4.357106773), (20.100000016, 3.649999992))
            Line((20.100000016, 3.649999992), (20.100000016, 2.000000008))
        make_face(mode=Mode.SUBTRACT)
    extrude(amount=-AUFSATZ_LINEAR_AUSTRAGEN1_DEPTH)


solid = part.part
